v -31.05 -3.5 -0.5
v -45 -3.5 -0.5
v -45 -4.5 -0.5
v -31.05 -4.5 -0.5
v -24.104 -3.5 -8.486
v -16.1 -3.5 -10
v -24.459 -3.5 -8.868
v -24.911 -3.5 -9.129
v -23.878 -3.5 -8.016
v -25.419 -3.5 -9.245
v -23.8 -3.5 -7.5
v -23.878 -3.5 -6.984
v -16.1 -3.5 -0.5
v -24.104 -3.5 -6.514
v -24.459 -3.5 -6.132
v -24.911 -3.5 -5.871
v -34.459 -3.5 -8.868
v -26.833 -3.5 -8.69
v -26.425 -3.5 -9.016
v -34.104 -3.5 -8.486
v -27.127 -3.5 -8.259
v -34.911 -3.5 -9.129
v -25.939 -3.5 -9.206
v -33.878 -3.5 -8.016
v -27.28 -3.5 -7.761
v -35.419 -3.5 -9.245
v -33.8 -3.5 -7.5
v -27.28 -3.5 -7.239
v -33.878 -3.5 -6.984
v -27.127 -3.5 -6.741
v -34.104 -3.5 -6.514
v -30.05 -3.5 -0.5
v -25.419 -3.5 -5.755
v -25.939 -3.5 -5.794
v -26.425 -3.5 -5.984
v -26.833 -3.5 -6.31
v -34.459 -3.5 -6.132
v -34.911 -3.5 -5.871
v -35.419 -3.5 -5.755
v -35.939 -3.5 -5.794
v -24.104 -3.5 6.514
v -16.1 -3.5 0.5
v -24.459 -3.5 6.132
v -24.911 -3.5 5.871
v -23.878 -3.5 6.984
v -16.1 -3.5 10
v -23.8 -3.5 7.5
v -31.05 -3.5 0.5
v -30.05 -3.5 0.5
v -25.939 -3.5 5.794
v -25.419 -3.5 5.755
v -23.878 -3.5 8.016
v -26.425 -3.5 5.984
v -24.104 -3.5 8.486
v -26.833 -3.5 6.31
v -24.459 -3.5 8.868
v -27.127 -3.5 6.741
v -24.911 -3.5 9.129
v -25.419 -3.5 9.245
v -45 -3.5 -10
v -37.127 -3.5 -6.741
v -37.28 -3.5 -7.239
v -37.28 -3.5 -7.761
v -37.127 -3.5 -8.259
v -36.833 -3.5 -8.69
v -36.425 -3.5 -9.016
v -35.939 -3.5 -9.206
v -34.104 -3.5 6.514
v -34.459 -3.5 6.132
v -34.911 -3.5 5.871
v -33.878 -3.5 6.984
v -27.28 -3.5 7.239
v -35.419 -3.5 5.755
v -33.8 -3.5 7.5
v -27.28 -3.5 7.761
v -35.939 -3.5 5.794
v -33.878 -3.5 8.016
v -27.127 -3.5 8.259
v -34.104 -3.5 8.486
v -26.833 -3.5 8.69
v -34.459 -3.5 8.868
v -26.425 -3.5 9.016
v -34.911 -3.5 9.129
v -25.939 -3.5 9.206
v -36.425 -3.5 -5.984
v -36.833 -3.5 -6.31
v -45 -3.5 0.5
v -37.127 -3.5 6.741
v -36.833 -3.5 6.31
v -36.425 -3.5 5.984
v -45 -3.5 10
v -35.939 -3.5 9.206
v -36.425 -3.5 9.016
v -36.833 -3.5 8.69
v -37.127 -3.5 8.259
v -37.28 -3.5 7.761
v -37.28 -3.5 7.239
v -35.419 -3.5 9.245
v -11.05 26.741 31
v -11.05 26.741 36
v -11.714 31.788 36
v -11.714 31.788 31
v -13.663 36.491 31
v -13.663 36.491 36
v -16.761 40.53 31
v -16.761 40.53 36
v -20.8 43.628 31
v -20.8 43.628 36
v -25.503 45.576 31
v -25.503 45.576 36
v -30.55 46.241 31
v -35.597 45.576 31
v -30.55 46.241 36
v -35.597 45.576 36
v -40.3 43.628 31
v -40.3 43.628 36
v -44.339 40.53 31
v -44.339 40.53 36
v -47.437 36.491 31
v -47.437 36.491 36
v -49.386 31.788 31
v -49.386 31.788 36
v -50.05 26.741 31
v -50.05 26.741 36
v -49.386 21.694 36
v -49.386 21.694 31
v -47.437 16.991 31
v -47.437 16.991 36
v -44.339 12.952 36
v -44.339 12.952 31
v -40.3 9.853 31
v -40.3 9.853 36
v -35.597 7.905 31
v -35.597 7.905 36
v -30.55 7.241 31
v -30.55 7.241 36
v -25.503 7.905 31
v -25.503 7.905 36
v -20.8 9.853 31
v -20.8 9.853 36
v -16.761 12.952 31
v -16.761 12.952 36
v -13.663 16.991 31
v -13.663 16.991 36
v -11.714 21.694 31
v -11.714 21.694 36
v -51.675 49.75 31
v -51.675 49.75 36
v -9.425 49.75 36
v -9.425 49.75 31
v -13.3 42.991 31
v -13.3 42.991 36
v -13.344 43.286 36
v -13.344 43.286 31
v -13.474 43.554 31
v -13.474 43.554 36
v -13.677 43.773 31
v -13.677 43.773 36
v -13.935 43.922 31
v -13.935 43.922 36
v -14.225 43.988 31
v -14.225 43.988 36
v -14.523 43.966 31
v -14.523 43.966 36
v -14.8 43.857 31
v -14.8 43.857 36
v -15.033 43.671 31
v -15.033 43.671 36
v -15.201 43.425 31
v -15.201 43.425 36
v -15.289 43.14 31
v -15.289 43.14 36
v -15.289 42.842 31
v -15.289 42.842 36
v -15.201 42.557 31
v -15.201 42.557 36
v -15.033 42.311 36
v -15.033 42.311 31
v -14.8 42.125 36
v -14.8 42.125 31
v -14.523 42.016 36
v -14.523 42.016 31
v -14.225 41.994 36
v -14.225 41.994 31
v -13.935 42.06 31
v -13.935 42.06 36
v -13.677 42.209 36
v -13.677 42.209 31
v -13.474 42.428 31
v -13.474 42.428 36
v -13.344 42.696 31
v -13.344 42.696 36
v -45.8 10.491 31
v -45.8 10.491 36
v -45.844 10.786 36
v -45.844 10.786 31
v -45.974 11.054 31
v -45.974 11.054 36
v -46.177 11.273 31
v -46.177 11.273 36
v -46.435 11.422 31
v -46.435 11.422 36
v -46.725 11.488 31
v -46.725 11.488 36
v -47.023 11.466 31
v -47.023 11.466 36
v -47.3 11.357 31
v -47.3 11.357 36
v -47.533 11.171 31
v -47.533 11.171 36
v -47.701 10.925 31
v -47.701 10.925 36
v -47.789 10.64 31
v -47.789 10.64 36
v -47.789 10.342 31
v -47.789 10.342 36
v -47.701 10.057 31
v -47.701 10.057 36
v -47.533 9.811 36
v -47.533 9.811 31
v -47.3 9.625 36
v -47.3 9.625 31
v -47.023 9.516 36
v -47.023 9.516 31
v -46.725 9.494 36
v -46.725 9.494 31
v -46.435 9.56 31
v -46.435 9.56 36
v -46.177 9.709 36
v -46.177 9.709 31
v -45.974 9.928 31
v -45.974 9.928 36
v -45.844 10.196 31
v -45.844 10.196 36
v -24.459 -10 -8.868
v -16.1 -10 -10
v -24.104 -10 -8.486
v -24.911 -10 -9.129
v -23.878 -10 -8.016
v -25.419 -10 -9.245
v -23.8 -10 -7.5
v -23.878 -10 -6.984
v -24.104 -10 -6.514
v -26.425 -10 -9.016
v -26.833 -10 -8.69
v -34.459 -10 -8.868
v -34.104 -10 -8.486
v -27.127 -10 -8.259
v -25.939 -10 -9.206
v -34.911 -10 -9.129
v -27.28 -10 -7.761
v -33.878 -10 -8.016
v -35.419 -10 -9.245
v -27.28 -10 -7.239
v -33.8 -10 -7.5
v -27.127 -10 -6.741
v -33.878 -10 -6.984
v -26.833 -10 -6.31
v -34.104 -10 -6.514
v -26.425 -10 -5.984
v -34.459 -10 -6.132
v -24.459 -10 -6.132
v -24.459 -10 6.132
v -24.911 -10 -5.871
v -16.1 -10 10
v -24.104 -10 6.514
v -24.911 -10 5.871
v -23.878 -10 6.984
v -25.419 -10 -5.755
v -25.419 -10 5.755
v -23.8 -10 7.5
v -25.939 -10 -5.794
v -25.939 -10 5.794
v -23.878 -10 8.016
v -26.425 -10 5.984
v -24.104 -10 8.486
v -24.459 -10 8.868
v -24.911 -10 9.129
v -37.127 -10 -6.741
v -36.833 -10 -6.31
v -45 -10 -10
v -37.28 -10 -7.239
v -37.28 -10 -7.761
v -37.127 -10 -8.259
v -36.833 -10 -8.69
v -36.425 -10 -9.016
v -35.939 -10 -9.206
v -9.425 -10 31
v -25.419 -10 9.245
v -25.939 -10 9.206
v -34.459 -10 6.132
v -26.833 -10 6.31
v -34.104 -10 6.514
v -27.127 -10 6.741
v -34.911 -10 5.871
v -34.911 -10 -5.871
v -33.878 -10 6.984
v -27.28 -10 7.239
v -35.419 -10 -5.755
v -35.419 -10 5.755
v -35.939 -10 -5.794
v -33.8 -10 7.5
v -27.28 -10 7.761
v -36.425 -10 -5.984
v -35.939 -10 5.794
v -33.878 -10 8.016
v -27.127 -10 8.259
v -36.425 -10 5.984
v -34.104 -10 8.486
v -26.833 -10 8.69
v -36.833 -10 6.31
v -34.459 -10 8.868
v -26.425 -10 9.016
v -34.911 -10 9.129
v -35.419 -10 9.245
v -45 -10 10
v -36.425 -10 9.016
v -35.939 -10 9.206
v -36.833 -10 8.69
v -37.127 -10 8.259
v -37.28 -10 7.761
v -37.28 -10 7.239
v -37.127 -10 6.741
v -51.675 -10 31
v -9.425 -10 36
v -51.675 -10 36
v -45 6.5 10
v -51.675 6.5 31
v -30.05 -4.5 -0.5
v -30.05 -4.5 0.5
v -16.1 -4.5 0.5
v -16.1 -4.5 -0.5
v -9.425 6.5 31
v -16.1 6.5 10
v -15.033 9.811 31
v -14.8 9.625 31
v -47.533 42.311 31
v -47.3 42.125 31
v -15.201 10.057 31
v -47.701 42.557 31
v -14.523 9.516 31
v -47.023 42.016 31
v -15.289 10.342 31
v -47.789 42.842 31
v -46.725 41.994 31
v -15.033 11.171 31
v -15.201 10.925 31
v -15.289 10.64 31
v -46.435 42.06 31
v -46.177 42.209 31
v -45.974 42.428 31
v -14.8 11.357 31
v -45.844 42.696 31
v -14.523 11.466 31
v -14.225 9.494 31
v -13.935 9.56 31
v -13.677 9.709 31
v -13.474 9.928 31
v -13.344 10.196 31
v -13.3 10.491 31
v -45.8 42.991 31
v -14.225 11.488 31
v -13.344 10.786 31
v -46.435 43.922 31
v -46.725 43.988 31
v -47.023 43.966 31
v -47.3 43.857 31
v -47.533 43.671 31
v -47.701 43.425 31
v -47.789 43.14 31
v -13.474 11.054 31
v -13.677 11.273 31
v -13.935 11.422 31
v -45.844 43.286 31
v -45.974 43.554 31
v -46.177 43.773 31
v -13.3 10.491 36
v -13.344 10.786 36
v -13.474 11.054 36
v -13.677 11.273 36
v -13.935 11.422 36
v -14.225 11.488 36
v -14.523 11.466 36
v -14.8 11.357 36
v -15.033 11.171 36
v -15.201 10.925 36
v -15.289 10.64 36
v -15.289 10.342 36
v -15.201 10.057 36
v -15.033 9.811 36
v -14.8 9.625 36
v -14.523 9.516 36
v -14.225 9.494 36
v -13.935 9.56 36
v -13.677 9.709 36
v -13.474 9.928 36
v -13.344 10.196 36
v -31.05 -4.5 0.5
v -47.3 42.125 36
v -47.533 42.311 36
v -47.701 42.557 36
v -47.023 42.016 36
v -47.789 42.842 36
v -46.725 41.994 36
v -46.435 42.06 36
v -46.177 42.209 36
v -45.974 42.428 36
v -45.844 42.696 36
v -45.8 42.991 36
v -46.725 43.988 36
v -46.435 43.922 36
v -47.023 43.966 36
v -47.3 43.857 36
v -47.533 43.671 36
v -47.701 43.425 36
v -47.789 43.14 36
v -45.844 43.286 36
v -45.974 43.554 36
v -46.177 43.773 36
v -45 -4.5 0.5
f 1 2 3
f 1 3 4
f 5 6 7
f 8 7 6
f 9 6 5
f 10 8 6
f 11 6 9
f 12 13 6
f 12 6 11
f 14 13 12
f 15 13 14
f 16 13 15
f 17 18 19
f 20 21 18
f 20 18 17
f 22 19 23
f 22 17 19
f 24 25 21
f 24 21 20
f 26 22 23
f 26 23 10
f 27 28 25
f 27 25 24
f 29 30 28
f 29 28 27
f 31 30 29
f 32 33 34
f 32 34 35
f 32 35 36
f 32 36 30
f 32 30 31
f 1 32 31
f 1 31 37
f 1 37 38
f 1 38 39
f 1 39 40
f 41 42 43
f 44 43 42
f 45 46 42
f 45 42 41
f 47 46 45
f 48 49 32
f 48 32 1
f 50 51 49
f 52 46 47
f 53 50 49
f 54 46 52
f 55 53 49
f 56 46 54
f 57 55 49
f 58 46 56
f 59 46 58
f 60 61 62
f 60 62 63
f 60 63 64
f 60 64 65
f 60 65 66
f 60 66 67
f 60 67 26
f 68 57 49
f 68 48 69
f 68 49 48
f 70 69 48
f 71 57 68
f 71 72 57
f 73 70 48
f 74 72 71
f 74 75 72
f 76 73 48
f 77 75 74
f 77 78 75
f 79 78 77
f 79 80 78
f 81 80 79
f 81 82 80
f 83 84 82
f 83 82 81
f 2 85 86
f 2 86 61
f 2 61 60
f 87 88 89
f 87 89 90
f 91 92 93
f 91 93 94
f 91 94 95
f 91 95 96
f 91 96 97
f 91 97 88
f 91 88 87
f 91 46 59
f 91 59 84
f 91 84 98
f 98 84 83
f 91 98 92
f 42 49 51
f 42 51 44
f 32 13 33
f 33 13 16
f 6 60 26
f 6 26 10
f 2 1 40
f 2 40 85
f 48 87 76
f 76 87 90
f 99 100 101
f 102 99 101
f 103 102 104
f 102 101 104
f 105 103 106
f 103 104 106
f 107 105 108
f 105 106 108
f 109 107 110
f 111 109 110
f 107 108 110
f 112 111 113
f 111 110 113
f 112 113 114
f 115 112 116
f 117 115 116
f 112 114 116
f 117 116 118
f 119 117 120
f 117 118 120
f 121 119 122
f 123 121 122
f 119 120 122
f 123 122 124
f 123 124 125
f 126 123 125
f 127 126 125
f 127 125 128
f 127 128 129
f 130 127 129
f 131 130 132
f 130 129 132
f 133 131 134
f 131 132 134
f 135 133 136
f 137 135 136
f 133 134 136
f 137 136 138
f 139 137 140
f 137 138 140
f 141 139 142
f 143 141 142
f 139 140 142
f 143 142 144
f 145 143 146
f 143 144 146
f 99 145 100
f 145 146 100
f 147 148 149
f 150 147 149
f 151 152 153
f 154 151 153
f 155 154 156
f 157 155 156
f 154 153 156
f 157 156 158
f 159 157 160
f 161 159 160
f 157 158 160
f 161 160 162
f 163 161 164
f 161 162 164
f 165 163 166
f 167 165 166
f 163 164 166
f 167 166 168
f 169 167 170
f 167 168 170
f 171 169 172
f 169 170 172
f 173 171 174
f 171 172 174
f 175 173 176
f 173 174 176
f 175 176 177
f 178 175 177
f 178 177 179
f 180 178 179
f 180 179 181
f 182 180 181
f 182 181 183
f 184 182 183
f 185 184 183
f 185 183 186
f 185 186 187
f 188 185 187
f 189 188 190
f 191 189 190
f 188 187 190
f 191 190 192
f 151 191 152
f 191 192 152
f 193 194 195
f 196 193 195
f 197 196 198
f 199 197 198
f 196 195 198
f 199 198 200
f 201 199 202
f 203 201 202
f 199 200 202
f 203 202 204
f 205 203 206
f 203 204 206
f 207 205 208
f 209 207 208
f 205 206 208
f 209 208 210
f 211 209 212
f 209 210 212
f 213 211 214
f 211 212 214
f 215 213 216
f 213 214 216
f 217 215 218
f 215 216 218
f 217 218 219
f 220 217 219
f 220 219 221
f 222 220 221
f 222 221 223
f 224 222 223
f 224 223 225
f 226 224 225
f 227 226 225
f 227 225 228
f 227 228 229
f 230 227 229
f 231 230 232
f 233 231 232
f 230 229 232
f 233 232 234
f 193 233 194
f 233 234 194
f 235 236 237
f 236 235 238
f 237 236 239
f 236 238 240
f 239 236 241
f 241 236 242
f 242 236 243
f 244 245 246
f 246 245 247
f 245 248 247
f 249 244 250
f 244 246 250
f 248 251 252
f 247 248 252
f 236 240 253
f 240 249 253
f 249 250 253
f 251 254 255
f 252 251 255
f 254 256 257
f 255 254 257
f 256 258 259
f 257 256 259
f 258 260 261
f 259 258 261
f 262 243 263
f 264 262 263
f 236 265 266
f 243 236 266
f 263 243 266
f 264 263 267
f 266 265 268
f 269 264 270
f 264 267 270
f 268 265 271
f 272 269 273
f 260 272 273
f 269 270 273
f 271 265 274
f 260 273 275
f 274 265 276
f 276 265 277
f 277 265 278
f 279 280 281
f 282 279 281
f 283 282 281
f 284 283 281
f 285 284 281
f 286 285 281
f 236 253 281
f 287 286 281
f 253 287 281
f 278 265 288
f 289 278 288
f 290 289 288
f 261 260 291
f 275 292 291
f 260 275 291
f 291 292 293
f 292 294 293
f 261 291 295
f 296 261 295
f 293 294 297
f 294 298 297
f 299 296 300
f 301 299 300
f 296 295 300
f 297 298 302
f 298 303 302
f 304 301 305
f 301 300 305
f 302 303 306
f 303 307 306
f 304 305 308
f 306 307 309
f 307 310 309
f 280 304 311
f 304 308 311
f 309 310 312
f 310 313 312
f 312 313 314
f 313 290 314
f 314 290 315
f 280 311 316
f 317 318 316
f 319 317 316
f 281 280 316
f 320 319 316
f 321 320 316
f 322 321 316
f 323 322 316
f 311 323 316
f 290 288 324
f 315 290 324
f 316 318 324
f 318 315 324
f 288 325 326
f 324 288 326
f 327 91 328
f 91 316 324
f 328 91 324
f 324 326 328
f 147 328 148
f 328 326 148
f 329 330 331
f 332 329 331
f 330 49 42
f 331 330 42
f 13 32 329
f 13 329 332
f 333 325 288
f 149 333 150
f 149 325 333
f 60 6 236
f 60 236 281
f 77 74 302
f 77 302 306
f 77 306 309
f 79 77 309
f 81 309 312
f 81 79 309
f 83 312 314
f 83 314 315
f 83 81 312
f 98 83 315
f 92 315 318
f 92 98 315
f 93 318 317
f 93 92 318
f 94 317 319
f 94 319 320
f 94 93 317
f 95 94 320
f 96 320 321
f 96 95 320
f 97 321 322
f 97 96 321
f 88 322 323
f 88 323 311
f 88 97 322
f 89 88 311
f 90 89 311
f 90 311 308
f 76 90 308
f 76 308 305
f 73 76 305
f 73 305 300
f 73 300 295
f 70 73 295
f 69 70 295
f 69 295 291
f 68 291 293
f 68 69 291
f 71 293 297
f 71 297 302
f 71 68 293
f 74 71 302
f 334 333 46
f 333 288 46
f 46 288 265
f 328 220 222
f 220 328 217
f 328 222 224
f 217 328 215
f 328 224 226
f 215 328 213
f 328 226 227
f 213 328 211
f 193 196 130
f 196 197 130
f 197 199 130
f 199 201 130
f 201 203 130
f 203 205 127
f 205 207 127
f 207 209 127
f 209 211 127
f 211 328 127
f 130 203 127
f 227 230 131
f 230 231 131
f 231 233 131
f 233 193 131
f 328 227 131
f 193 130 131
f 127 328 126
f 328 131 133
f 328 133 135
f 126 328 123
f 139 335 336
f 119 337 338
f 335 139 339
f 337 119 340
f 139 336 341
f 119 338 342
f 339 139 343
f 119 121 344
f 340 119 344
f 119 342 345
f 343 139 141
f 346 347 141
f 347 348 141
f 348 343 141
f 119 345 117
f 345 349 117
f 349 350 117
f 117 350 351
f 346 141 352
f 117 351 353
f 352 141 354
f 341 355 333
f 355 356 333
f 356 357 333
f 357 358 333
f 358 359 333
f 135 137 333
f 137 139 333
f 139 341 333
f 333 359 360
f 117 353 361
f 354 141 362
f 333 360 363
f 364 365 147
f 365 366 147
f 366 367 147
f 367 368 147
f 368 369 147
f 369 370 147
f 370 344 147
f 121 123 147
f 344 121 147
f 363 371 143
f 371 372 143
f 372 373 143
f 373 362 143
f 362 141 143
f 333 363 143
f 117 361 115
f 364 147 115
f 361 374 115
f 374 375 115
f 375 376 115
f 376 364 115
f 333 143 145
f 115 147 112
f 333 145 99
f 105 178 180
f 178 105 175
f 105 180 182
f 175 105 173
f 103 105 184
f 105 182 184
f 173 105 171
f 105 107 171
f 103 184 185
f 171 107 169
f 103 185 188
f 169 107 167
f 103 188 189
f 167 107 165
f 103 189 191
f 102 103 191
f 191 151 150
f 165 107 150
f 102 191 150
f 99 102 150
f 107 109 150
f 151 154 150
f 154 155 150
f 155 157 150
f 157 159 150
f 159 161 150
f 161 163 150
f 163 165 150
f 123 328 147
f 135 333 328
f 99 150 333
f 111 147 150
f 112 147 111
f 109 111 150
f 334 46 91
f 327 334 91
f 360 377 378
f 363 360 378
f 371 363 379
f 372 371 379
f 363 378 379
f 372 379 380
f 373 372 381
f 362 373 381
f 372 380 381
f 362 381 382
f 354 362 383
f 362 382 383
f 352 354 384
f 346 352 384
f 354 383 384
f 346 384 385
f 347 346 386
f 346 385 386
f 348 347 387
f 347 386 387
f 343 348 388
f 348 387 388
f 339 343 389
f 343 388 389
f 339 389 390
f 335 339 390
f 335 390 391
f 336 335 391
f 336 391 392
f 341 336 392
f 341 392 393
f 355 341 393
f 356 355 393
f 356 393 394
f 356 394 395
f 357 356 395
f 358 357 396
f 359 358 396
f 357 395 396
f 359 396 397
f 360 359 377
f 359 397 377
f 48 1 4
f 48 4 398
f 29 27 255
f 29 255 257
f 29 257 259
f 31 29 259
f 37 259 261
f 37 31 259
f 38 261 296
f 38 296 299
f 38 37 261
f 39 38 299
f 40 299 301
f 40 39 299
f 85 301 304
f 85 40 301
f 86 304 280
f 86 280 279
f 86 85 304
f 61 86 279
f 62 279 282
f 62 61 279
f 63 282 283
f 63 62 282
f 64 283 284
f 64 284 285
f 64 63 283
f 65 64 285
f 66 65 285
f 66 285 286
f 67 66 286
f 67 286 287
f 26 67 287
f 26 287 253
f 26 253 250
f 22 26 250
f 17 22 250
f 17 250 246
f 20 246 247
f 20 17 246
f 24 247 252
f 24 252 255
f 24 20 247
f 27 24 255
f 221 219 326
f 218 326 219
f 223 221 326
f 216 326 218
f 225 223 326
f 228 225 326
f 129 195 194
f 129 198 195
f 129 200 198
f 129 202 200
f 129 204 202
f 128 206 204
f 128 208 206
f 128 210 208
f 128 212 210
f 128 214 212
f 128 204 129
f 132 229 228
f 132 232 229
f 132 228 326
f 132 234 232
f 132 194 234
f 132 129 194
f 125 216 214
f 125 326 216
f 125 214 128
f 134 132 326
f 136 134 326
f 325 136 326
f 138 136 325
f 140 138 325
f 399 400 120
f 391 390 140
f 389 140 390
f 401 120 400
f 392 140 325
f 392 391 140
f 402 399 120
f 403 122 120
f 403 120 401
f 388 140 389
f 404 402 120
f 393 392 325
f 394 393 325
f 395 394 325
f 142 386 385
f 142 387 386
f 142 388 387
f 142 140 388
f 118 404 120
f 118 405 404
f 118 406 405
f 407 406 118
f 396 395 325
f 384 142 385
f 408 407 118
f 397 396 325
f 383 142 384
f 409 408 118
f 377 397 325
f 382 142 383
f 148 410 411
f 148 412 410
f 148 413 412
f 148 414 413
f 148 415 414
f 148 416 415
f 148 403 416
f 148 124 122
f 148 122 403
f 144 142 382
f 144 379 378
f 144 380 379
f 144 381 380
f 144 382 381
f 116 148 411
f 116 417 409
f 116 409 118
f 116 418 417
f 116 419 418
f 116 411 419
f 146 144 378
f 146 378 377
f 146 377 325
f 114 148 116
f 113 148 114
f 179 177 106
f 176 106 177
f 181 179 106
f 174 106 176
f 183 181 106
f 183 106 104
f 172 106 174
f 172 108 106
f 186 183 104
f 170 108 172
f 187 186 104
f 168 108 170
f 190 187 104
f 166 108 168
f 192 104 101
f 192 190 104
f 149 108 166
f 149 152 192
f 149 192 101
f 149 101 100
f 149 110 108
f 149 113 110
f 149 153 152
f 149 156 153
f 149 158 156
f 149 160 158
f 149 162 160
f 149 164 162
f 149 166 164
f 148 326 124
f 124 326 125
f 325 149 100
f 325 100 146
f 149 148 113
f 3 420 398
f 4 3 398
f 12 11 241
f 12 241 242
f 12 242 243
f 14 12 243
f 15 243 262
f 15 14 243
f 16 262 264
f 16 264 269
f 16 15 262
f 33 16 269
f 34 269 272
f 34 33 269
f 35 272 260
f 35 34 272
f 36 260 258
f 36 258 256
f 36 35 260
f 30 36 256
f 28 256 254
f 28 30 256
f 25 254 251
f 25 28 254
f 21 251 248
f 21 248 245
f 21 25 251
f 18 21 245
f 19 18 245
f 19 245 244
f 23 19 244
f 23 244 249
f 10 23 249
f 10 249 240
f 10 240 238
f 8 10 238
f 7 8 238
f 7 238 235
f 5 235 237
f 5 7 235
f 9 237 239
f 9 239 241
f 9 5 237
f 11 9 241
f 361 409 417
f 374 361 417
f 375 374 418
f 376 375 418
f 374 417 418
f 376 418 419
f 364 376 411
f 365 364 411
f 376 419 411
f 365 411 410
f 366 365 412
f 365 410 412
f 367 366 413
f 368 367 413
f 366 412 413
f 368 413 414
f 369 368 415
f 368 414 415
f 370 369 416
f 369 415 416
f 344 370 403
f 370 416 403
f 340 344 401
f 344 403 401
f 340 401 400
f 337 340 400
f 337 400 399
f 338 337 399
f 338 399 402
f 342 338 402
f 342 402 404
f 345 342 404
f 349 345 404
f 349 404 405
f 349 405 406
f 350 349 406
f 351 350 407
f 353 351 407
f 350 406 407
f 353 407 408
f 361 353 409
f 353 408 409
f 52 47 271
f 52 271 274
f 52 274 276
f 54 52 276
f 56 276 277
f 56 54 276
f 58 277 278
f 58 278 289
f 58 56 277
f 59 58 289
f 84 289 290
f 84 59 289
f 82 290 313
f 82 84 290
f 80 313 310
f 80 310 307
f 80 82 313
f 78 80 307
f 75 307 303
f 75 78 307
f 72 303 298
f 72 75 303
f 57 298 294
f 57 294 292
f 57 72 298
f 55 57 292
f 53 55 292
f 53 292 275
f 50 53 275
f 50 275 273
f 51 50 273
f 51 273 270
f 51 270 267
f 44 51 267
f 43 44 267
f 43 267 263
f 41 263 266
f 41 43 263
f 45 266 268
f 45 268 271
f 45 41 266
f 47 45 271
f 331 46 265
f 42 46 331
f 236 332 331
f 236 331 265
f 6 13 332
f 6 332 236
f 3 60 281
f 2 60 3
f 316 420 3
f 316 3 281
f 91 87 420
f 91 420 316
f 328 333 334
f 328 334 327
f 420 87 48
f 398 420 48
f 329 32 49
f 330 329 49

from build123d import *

# Parameters (mm, degrees)
SKETCH010_R     = 1.75
PAD005_DEPTH    = 6.5
PAD006_DEPTH    = 10
SKETCH012_R     = 3
POCKET004_DEPTH = 14.45
SKETCH013_W     = 42.25
SKETCH013_H     = 43.25
SKETCH013_R     = 19.5
SKETCH013_R_2   = 1
PAD007_DEPTH    = 5
SKETCH054_W     = 13.95
SKETCH054_H     = 1
POCKET023_DEPTH = 1


with BuildPart() as part:
    # Sketch010 → Pad005 (new body)
    with BuildSketch(Plane.XZ):
        Polygon((14.45, 10), (14.45, -10), (-14.45, -10), (-14.45, 10), (-21.125, 31), (-21.125, 36), (21.125, 36), (21.125, 31), align=None)
        with Locations((-5, 7.5)):
            Circle(SKETCH010_R, mode=Mode.SUBTRACT)
        with Locations((5, 7.5)):
            Circle(SKETCH010_R, mode=Mode.SUBTRACT)
        with Locations((-5, -7.5)):
            Circle(SKETCH010_R, mode=Mode.SUBTRACT)
        with Locations((5, -7.5)):
            Circle(SKETCH010_R, mode=Mode.SUBTRACT)
    extrude(amount=PAD005_DEPTH)

    # Sketch011 → Pad006 (join)
    with BuildSketch(Plane.XZ):
        Polygon((-21.125, 36), (21.125, 36), (21.125, 31), (14.45, 10), (-14.45, 10), (-21.125, 31), align=None)
    extrude(amount=-PAD006_DEPTH)

    # Sketch012 → Pocket004 (cut, symmetric)
    with BuildSketch(Plane.YZ):
        with Locations((5, -14.5)):
            Circle(SKETCH012_R)
    extrude(amount=POCKET004_DEPTH, both=True, mode=Mode.SUBTRACT)

    # Sketch013 → Pad007 (join)
    with BuildSketch(Plane.XY.offset(36)):
        with Locations((0, 31.625)):
            Rectangle(SKETCH013_W, SKETCH013_H)
        with Locations((0, 30.240935)):
            Circle(SKETCH013_R, mode=Mode.SUBTRACT)
        with Locations((-16.25, 46.490935)):
            Circle(SKETCH013_R_2, mode=Mode.SUBTRACT)
        with Locations((16.25, 46.490935)):
            Circle(SKETCH013_R_2, mode=Mode.SUBTRACT)
        with Locations((16.25, 13.990935)):
            Circle(SKETCH013_R_2, mode=Mode.SUBTRACT)
        with Locations((-16.25, 13.990935)):
            Circle(SKETCH013_R_2, mode=Mode.SUBTRACT)
    extrude(amount=-PAD007_DEPTH)

    # Sketch054 → Pocket023 (cut)
    with BuildSketch(Plane.XZ):
        with Locations((-7.475, 0)):
            Rectangle(SKETCH054_W, SKETCH054_H)
        with Locations((7.475, 0)):
            Rectangle(SKETCH054_W, SKETCH054_H)
    extrude(amount=POCKET023_DEPTH, mode=Mode.SUBTRACT)


with BuildPart() as part_1:
    # Body003 placement: moved
    add(part.part.moved(Location((-30.55, -3.5, 0))))


solid = part_1.part
